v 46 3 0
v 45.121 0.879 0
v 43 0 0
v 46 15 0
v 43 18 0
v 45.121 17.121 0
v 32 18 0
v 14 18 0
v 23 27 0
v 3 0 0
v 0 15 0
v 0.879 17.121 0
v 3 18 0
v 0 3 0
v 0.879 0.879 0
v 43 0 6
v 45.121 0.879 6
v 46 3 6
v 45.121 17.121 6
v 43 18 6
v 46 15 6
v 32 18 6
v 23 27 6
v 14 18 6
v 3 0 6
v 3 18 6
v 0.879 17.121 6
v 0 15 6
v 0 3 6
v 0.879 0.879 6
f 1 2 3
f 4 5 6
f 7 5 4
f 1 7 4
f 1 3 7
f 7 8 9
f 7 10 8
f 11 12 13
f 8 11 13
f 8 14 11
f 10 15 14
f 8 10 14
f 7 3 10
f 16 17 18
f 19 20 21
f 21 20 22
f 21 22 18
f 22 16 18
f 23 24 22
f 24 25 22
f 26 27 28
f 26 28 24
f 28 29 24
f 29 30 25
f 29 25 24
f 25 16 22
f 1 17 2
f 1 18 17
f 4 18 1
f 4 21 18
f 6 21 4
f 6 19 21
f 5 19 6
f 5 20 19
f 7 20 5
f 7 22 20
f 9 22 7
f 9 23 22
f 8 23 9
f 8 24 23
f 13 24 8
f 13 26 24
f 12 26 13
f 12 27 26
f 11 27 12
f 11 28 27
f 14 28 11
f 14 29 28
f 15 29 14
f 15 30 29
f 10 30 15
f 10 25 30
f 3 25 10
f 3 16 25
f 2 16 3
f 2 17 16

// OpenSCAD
$fn = 32;

// ----------------------------------------------------------------------
// Ratchet pawl: 46 x 18 mm body, beak 9 mm сверху
// ----------------------------------------------------------------------

// --- parameters (mm) ---
profile_height = 6;       // extrusion height
profile_points = 15;      // points of the closed outline

profile = [[0, 3], [0.879, 0.879], [3, 0], [43, 0], [45.121, 0.879], [46, 3], [46, 15], [45.121, 17.121], [43, 18], [32, 18], [23, 27], [14, 18], [3, 18], [0.879, 17.121], [0, 15]];  // single closed polygon, 15 points, counter clockwise

// --- the one profile operation ---
linear_extrude(height = profile_height) polygon(points = profile);
